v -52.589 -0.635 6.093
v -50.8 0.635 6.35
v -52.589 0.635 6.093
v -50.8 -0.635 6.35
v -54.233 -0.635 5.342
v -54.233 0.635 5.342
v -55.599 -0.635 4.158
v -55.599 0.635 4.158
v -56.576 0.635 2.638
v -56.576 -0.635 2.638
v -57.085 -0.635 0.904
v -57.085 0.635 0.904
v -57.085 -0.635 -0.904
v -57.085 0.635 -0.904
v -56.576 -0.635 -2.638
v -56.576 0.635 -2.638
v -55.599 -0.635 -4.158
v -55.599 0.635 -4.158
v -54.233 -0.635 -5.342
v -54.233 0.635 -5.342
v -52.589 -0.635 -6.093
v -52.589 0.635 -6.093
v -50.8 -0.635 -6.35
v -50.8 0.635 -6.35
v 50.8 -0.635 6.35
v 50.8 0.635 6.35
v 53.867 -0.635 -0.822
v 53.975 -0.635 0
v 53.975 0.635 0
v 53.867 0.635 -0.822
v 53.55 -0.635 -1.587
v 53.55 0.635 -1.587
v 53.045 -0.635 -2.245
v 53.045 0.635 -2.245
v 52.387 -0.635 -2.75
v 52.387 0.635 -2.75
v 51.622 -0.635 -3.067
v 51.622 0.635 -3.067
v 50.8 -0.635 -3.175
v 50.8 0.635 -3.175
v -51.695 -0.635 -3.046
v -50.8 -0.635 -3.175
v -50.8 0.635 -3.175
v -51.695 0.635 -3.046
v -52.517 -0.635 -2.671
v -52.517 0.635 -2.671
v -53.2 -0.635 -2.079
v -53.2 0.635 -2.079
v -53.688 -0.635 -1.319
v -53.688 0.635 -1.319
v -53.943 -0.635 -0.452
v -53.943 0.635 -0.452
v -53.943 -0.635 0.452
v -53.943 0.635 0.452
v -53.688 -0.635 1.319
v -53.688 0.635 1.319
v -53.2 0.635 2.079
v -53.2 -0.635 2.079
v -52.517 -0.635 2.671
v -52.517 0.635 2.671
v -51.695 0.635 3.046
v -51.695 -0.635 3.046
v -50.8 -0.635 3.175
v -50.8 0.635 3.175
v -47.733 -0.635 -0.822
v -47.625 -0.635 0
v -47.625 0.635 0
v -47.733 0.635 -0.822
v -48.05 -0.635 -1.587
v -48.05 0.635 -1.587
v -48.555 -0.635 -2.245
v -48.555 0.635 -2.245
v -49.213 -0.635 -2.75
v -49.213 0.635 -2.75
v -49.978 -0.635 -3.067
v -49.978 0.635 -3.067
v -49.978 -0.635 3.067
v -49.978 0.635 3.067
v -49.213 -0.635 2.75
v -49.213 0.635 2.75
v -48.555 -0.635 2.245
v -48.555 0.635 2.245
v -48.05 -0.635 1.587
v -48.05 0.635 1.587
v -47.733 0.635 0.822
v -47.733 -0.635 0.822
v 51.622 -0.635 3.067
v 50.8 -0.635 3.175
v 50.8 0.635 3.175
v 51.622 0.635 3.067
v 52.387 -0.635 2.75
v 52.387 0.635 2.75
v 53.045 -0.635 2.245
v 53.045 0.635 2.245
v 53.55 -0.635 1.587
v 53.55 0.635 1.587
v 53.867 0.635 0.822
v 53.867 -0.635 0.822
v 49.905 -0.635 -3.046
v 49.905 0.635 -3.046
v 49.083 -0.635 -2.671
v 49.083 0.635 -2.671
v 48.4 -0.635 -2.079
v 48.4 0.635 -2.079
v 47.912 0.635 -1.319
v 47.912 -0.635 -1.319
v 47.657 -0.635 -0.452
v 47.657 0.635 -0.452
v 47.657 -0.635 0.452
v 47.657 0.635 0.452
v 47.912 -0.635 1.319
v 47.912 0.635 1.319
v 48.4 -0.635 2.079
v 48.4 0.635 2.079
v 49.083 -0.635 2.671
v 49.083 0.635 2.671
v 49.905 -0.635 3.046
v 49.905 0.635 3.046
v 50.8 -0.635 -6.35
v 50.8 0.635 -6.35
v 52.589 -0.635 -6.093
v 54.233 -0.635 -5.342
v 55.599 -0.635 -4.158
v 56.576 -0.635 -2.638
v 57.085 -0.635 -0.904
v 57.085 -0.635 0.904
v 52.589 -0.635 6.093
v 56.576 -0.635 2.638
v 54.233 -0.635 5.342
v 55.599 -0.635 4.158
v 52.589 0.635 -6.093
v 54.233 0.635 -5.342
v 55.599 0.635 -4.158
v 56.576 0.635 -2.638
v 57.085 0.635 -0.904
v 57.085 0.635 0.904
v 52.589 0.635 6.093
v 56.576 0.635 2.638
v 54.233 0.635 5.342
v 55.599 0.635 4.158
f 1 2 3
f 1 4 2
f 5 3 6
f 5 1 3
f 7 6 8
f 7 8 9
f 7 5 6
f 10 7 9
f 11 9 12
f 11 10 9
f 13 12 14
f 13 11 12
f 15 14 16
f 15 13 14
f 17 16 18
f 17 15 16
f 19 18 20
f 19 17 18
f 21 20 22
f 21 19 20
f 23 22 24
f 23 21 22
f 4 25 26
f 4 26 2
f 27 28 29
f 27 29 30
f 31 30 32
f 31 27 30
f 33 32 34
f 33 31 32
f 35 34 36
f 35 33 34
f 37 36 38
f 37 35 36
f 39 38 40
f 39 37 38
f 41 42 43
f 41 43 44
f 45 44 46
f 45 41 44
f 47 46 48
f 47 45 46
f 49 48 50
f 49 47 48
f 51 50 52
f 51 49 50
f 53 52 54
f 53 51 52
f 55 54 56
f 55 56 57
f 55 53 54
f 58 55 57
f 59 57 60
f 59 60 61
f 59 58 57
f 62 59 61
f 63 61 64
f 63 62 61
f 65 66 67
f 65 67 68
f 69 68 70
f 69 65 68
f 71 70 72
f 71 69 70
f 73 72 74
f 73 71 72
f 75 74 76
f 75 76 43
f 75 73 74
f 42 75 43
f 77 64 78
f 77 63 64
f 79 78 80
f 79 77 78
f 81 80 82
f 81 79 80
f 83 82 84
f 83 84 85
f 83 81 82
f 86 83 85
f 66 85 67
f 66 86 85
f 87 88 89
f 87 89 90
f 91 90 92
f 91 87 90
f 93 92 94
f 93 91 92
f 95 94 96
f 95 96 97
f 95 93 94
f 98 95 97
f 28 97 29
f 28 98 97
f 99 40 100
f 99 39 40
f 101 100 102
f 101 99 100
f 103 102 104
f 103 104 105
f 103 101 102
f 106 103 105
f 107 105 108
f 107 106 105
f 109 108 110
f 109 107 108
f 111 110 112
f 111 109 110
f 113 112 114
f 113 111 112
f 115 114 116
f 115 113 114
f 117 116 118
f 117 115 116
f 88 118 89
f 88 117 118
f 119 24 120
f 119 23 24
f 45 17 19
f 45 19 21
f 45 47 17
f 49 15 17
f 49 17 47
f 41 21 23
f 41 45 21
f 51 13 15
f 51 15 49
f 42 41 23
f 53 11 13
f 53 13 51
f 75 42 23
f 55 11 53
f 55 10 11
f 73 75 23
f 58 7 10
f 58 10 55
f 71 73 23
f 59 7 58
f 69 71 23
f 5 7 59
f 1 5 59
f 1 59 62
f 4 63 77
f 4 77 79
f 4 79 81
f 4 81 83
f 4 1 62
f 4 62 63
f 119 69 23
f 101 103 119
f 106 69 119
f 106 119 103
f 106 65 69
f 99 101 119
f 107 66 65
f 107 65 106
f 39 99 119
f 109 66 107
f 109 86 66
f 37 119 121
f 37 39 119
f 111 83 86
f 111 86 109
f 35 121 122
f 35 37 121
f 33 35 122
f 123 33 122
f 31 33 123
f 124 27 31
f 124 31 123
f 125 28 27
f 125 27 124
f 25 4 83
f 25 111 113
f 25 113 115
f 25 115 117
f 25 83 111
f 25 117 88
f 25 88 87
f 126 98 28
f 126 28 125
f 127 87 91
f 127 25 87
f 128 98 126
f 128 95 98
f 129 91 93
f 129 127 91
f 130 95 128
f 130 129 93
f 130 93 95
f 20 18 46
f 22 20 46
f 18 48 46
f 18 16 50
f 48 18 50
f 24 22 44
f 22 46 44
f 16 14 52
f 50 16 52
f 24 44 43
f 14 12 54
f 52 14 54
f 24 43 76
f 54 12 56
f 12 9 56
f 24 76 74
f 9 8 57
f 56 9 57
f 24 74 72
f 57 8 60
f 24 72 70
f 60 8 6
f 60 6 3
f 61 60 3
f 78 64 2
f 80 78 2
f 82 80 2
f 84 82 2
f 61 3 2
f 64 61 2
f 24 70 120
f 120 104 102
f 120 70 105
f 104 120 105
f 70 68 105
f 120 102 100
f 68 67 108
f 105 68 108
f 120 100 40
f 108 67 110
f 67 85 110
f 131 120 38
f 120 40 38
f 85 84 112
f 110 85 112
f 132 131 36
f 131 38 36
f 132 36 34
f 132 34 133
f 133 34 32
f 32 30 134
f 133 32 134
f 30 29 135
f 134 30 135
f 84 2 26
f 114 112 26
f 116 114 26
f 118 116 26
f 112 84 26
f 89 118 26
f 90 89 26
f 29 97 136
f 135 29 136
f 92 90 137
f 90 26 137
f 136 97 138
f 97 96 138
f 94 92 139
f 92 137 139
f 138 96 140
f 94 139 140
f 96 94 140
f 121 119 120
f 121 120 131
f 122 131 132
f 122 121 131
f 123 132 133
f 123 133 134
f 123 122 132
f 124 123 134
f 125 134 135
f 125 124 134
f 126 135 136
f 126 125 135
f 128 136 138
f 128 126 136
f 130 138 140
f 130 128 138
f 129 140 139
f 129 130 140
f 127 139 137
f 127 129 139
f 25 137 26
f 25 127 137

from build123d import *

# Parameters (mm, degrees)
F1_DEPTH = 0.635


with BuildPart() as f1:
    # F0 (on Front) → F1 (new body, symmetric)
    with BuildSketch(Plane.XZ):
        with BuildLine():
            Line((-50.8, -6.35), (50.8, -6.35))
            Line((50.8, -6.35), (50.8, -3.175))
            ThreePointArc((50.8, -3.175), (47.625, 0), (50.8, 3.175))
            Line((50.8, 3.175), (50.8, 6.35))
            Line((50.8, 6.35), (-50.8, 6.35))
            Line((-50.8, 6.35), (-50.8, 3.175))
            ThreePointArc((-50.8, 3.175), (-48.554936, 2.245064), (-47.625, 0))
            ThreePointArc((-47.625, 0), (-48.554936, -2.245064), (-50.8, -3.175))
            Line((-50.8, -3.175), (-50.8, -6.35))
        make_face()
        with BuildLine():
            Line((50.8, -3.175), (50.8, -6.35))
            ThreePointArc((50.8, -6.35), (57.15, 0), (50.8, 6.35))
            Line((50.8, 6.35), (50.8, 3.175))
            ThreePointArc((50.8, 3.175), (53.045064, 2.245064), (53.975, 0))
            ThreePointArc((53.975, 0), (53.045064, -2.245064), (50.8, -3.175))
        make_face()
        with BuildLine():
            ThreePointArc((-50.8, 6.35), (-57.15, 0), (-50.8, -6.35))
            Line((-50.8, -6.35), (-50.8, -3.175))
            ThreePointArc((-50.8, -3.175), (-53.975, 0), (-50.8, 3.175))
            Line((-50.8, 3.175), (-50.8, 6.35))
        make_face()
    extrude(amount=F1_DEPTH, both=True)


solid = f1.part
